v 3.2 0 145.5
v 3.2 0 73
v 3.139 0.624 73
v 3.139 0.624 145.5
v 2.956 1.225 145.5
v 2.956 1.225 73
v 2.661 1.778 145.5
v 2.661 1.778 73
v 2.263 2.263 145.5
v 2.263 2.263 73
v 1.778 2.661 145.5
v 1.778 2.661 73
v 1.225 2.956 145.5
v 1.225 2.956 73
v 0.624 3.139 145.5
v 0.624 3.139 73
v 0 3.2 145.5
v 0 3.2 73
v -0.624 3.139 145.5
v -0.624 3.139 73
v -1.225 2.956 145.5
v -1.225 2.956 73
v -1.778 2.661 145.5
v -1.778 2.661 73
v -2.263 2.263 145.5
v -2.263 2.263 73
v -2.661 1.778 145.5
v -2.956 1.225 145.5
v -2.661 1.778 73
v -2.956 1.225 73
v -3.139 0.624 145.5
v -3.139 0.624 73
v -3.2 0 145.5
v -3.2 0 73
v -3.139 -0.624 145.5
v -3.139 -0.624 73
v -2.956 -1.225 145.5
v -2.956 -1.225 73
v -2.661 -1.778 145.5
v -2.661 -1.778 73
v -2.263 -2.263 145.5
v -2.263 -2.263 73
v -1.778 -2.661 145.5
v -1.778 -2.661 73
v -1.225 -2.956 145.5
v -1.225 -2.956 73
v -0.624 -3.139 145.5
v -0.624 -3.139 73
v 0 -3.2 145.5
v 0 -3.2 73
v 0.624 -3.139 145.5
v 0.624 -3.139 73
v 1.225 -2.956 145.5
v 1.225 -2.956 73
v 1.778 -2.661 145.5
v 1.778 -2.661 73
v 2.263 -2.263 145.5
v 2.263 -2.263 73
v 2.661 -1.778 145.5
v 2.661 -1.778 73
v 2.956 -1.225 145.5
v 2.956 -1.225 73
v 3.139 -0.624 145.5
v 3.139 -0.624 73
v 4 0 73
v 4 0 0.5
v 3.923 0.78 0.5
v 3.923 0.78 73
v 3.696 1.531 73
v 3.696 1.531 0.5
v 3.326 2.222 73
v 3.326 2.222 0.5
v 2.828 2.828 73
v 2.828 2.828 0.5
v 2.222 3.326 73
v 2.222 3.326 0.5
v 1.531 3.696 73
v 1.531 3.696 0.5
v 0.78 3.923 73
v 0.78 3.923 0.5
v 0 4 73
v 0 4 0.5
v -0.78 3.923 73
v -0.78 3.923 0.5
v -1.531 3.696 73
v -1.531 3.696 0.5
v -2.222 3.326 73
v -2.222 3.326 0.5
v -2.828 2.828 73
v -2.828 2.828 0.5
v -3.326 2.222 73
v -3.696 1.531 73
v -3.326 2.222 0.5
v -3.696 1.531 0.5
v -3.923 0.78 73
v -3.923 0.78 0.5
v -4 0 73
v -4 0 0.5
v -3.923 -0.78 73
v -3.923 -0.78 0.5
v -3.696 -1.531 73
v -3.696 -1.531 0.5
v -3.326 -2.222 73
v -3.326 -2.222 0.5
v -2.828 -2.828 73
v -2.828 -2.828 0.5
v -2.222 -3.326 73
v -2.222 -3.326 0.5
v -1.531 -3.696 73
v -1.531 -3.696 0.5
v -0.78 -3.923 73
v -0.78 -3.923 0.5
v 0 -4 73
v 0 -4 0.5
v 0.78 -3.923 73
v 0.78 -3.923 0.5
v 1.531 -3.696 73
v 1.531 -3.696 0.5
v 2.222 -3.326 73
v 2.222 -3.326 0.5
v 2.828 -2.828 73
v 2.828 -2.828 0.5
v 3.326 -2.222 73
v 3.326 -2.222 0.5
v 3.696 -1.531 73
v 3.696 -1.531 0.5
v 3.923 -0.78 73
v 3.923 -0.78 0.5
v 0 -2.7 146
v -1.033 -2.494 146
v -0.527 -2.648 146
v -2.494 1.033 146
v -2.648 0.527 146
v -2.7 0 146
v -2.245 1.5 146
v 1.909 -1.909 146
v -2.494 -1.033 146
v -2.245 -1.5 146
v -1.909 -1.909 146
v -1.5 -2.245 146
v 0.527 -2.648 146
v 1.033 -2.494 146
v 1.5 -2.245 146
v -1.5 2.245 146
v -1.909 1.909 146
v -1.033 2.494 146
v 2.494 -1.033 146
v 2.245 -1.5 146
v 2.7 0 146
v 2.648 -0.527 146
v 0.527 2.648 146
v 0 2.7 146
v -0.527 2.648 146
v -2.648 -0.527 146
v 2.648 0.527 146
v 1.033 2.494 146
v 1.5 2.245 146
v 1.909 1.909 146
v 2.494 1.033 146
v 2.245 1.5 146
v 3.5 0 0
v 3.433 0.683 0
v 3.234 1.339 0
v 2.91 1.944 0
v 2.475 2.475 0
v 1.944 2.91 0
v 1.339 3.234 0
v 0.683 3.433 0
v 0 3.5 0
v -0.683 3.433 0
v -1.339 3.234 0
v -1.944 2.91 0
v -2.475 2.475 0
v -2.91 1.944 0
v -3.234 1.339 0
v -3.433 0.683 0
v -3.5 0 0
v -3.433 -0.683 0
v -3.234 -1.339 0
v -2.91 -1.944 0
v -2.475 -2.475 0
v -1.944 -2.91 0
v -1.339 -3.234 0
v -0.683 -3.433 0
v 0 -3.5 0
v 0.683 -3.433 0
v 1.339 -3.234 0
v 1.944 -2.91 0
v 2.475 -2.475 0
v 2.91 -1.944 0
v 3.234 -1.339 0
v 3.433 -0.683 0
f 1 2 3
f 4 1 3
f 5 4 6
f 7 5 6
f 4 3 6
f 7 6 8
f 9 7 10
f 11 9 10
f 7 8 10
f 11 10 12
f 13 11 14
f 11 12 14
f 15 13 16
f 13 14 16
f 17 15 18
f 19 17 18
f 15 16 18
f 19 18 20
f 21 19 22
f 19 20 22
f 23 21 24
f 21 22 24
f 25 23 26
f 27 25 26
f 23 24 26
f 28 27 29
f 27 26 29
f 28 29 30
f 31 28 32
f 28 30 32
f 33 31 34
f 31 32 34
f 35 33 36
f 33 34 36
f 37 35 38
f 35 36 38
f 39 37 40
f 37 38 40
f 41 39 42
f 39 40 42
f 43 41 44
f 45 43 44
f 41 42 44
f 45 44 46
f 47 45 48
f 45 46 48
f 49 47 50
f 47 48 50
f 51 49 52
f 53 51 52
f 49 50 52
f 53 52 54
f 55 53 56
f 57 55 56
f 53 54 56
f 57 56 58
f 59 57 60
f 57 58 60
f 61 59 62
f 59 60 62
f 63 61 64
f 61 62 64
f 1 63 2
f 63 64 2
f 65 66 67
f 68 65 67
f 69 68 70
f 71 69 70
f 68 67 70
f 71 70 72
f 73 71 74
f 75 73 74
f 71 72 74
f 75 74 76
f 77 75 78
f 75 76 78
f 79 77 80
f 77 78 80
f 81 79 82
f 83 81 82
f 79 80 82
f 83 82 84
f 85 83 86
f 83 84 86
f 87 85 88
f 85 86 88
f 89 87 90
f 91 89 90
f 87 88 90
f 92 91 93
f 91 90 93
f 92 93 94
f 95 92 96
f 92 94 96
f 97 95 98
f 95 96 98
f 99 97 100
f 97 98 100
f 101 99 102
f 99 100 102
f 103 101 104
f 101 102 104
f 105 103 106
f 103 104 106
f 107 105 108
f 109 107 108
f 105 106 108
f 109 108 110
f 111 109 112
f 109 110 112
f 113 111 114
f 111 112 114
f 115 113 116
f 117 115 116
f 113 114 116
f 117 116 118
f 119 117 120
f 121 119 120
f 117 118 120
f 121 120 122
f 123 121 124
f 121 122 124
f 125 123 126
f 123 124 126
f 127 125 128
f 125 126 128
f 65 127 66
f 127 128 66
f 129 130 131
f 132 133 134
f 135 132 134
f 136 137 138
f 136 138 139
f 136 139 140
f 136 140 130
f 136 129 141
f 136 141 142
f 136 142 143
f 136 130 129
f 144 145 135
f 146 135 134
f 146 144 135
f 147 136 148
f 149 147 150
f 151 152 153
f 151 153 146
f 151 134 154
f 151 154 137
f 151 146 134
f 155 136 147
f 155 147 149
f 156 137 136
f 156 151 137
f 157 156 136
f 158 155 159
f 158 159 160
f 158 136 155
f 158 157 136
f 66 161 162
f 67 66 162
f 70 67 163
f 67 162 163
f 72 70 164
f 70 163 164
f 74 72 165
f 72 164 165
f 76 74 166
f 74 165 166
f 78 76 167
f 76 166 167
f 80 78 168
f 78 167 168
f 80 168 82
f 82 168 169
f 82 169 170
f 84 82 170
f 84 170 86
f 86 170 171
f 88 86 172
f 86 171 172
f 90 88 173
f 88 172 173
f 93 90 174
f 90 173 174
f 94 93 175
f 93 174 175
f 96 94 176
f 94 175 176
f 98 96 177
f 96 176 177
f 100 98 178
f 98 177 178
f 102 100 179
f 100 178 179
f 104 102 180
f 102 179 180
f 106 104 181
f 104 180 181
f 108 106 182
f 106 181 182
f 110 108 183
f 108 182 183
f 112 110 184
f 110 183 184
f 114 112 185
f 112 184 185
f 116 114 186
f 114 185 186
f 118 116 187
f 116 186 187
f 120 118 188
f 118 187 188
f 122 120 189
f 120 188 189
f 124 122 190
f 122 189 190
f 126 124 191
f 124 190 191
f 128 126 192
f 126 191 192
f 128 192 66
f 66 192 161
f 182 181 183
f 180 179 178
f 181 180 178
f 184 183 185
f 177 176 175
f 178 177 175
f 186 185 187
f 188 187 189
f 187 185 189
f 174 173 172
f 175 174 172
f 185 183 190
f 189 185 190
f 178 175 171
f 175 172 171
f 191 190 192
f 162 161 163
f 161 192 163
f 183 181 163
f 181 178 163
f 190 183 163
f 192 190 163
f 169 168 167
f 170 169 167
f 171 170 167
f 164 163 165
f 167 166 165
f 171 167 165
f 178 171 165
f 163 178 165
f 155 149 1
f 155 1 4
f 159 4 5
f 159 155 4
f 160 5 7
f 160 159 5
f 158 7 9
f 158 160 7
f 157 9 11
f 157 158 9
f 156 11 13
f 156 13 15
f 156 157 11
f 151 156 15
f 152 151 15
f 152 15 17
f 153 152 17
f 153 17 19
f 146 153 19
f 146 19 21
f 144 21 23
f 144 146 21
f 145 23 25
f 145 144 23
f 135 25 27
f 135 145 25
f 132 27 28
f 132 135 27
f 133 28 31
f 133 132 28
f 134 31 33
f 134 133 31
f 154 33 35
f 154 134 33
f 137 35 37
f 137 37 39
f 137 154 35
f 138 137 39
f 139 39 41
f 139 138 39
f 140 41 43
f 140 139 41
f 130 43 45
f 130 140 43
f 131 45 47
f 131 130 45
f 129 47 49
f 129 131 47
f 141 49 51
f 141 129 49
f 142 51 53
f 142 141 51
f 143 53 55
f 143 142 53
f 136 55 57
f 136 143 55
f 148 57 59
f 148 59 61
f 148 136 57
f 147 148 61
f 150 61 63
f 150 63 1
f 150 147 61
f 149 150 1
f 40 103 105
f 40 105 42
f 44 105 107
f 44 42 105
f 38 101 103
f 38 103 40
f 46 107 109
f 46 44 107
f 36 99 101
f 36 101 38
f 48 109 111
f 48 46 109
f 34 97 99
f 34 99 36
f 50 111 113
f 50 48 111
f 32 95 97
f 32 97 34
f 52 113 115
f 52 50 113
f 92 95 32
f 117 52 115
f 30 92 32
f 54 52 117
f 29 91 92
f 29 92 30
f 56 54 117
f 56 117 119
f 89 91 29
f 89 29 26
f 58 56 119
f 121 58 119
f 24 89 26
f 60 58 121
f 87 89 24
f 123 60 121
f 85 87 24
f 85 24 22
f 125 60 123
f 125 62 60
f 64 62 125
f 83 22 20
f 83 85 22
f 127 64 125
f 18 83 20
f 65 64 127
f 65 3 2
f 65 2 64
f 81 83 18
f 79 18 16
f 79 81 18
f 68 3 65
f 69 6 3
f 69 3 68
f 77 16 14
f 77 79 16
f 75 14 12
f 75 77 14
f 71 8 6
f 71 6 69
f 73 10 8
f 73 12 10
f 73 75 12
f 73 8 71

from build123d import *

# Parameters (mm, degrees)
SKETCH1_R           = 4
BOSS_EXTRUDE1_DEPTH = 73
SKETCH2_R           = 3.2
BOSS_EXTRUDE2_DEPTH = 73
CHAMFER1_SIZE       = 0.5


with BuildPart() as part:
    # Sketch1 → Boss-Extrude1 (new body)
    with BuildSketch(Plane.XY):
        Circle(SKETCH1_R)
    extrude(amount=BOSS_EXTRUDE1_DEPTH)

    # Sketch2 → Boss-Extrude2 (add)
    with BuildSketch(Plane.XY.offset(73)):
        Circle(SKETCH2_R)
    extrude(amount=BOSS_EXTRUDE2_DEPTH)

    # Chamfer1
    chamfer1_edges = [part.edges().sort_by_distance(p)[0] for p in [
        (-4, 0, 0),
        (-3.2, 0, 146),
    ]]
    chamfer(chamfer1_edges, length=CHAMFER1_SIZE)


solid = part.part
